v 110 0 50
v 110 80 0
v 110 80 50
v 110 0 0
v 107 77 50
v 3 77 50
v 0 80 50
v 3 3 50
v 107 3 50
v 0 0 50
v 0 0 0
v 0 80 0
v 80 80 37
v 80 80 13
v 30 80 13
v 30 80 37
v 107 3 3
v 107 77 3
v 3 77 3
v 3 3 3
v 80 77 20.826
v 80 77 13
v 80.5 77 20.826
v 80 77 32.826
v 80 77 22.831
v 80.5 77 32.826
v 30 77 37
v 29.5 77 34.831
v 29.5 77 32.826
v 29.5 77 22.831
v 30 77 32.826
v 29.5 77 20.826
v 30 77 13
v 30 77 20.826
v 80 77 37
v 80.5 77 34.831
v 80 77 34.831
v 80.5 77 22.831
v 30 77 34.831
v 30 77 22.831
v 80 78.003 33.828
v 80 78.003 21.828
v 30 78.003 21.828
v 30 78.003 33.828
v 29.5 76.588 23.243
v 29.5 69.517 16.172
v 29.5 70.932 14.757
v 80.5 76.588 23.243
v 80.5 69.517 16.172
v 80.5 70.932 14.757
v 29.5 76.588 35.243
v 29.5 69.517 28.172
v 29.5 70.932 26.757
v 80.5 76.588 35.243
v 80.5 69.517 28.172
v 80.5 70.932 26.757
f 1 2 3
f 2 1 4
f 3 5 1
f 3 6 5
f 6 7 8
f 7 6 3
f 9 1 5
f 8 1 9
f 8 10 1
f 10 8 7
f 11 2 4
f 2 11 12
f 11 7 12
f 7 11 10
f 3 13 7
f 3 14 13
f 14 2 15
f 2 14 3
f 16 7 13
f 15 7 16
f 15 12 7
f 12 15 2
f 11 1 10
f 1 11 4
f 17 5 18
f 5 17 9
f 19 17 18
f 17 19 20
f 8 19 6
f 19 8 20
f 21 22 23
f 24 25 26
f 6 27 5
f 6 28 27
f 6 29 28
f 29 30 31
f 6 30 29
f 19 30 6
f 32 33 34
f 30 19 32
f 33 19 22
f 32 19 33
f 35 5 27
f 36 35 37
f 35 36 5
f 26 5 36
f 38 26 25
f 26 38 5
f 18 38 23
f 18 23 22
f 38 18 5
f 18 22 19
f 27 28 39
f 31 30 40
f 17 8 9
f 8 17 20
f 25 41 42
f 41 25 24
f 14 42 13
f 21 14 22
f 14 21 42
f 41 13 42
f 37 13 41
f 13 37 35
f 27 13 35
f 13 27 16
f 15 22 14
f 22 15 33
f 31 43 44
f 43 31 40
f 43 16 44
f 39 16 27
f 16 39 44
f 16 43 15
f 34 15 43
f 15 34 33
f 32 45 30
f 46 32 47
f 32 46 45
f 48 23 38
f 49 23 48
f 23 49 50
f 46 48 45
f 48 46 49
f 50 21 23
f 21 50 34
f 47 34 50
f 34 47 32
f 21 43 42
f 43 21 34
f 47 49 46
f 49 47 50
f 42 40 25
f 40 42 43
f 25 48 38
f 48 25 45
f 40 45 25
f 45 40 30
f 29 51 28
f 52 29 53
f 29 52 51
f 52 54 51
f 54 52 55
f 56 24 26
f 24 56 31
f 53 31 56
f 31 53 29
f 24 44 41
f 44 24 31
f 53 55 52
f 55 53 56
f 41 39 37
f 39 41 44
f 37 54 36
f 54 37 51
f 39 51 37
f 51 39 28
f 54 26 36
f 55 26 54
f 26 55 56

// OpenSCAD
$fn = 32;

// ----------------------------------------------------------------------
// Vent box: louvers enclosure
// ----------------------------------------------------------------------

// --- parameters (mm) ---
box_l = 110;              // box length, X
box_w = 80;               // box width, Y
box_h = 50;               // box height, Z
wall_t = 3;               // shell wall thickness
win_l = 50;               // vent window width, X
win_h = 24;               // vent window height, Z
slat_t = 2;               // louver slat thickness
slat_d = 10;              // louver slat depth
slat_a = 45;              // louver slat angle, degrees
slat_pitch = 12;          // louver pitch
slat_yc = 73.76;          // slat centreline Y

win_z0 = (box_h - win_h) / 2;  // window lower edge Z
n_slats = 2;  // louver count
slat_z0 = win_z0 + (win_h - (n_slats - 1) * slat_pitch) / 2;

difference() {
  union() {
    difference() {
      cube([box_l, box_w, box_h]);
  translate([wall_t, wall_t, wall_t])
    cube([box_l - 2 * wall_t, box_w - 2 * wall_t, box_h]);
  translate([(box_l - win_l) / 2, box_w - wall_t - 1, win_z0])
    cube([win_l, wall_t + 2, win_h]);
    }
    for (i = [0 : n_slats - 1])
      translate([box_l / 2, slat_yc, slat_z0 + i * slat_pitch])
        rotate([slat_a, 0, 0])
          cube([win_l + 1, slat_d, slat_t], center = true);
  }
}
